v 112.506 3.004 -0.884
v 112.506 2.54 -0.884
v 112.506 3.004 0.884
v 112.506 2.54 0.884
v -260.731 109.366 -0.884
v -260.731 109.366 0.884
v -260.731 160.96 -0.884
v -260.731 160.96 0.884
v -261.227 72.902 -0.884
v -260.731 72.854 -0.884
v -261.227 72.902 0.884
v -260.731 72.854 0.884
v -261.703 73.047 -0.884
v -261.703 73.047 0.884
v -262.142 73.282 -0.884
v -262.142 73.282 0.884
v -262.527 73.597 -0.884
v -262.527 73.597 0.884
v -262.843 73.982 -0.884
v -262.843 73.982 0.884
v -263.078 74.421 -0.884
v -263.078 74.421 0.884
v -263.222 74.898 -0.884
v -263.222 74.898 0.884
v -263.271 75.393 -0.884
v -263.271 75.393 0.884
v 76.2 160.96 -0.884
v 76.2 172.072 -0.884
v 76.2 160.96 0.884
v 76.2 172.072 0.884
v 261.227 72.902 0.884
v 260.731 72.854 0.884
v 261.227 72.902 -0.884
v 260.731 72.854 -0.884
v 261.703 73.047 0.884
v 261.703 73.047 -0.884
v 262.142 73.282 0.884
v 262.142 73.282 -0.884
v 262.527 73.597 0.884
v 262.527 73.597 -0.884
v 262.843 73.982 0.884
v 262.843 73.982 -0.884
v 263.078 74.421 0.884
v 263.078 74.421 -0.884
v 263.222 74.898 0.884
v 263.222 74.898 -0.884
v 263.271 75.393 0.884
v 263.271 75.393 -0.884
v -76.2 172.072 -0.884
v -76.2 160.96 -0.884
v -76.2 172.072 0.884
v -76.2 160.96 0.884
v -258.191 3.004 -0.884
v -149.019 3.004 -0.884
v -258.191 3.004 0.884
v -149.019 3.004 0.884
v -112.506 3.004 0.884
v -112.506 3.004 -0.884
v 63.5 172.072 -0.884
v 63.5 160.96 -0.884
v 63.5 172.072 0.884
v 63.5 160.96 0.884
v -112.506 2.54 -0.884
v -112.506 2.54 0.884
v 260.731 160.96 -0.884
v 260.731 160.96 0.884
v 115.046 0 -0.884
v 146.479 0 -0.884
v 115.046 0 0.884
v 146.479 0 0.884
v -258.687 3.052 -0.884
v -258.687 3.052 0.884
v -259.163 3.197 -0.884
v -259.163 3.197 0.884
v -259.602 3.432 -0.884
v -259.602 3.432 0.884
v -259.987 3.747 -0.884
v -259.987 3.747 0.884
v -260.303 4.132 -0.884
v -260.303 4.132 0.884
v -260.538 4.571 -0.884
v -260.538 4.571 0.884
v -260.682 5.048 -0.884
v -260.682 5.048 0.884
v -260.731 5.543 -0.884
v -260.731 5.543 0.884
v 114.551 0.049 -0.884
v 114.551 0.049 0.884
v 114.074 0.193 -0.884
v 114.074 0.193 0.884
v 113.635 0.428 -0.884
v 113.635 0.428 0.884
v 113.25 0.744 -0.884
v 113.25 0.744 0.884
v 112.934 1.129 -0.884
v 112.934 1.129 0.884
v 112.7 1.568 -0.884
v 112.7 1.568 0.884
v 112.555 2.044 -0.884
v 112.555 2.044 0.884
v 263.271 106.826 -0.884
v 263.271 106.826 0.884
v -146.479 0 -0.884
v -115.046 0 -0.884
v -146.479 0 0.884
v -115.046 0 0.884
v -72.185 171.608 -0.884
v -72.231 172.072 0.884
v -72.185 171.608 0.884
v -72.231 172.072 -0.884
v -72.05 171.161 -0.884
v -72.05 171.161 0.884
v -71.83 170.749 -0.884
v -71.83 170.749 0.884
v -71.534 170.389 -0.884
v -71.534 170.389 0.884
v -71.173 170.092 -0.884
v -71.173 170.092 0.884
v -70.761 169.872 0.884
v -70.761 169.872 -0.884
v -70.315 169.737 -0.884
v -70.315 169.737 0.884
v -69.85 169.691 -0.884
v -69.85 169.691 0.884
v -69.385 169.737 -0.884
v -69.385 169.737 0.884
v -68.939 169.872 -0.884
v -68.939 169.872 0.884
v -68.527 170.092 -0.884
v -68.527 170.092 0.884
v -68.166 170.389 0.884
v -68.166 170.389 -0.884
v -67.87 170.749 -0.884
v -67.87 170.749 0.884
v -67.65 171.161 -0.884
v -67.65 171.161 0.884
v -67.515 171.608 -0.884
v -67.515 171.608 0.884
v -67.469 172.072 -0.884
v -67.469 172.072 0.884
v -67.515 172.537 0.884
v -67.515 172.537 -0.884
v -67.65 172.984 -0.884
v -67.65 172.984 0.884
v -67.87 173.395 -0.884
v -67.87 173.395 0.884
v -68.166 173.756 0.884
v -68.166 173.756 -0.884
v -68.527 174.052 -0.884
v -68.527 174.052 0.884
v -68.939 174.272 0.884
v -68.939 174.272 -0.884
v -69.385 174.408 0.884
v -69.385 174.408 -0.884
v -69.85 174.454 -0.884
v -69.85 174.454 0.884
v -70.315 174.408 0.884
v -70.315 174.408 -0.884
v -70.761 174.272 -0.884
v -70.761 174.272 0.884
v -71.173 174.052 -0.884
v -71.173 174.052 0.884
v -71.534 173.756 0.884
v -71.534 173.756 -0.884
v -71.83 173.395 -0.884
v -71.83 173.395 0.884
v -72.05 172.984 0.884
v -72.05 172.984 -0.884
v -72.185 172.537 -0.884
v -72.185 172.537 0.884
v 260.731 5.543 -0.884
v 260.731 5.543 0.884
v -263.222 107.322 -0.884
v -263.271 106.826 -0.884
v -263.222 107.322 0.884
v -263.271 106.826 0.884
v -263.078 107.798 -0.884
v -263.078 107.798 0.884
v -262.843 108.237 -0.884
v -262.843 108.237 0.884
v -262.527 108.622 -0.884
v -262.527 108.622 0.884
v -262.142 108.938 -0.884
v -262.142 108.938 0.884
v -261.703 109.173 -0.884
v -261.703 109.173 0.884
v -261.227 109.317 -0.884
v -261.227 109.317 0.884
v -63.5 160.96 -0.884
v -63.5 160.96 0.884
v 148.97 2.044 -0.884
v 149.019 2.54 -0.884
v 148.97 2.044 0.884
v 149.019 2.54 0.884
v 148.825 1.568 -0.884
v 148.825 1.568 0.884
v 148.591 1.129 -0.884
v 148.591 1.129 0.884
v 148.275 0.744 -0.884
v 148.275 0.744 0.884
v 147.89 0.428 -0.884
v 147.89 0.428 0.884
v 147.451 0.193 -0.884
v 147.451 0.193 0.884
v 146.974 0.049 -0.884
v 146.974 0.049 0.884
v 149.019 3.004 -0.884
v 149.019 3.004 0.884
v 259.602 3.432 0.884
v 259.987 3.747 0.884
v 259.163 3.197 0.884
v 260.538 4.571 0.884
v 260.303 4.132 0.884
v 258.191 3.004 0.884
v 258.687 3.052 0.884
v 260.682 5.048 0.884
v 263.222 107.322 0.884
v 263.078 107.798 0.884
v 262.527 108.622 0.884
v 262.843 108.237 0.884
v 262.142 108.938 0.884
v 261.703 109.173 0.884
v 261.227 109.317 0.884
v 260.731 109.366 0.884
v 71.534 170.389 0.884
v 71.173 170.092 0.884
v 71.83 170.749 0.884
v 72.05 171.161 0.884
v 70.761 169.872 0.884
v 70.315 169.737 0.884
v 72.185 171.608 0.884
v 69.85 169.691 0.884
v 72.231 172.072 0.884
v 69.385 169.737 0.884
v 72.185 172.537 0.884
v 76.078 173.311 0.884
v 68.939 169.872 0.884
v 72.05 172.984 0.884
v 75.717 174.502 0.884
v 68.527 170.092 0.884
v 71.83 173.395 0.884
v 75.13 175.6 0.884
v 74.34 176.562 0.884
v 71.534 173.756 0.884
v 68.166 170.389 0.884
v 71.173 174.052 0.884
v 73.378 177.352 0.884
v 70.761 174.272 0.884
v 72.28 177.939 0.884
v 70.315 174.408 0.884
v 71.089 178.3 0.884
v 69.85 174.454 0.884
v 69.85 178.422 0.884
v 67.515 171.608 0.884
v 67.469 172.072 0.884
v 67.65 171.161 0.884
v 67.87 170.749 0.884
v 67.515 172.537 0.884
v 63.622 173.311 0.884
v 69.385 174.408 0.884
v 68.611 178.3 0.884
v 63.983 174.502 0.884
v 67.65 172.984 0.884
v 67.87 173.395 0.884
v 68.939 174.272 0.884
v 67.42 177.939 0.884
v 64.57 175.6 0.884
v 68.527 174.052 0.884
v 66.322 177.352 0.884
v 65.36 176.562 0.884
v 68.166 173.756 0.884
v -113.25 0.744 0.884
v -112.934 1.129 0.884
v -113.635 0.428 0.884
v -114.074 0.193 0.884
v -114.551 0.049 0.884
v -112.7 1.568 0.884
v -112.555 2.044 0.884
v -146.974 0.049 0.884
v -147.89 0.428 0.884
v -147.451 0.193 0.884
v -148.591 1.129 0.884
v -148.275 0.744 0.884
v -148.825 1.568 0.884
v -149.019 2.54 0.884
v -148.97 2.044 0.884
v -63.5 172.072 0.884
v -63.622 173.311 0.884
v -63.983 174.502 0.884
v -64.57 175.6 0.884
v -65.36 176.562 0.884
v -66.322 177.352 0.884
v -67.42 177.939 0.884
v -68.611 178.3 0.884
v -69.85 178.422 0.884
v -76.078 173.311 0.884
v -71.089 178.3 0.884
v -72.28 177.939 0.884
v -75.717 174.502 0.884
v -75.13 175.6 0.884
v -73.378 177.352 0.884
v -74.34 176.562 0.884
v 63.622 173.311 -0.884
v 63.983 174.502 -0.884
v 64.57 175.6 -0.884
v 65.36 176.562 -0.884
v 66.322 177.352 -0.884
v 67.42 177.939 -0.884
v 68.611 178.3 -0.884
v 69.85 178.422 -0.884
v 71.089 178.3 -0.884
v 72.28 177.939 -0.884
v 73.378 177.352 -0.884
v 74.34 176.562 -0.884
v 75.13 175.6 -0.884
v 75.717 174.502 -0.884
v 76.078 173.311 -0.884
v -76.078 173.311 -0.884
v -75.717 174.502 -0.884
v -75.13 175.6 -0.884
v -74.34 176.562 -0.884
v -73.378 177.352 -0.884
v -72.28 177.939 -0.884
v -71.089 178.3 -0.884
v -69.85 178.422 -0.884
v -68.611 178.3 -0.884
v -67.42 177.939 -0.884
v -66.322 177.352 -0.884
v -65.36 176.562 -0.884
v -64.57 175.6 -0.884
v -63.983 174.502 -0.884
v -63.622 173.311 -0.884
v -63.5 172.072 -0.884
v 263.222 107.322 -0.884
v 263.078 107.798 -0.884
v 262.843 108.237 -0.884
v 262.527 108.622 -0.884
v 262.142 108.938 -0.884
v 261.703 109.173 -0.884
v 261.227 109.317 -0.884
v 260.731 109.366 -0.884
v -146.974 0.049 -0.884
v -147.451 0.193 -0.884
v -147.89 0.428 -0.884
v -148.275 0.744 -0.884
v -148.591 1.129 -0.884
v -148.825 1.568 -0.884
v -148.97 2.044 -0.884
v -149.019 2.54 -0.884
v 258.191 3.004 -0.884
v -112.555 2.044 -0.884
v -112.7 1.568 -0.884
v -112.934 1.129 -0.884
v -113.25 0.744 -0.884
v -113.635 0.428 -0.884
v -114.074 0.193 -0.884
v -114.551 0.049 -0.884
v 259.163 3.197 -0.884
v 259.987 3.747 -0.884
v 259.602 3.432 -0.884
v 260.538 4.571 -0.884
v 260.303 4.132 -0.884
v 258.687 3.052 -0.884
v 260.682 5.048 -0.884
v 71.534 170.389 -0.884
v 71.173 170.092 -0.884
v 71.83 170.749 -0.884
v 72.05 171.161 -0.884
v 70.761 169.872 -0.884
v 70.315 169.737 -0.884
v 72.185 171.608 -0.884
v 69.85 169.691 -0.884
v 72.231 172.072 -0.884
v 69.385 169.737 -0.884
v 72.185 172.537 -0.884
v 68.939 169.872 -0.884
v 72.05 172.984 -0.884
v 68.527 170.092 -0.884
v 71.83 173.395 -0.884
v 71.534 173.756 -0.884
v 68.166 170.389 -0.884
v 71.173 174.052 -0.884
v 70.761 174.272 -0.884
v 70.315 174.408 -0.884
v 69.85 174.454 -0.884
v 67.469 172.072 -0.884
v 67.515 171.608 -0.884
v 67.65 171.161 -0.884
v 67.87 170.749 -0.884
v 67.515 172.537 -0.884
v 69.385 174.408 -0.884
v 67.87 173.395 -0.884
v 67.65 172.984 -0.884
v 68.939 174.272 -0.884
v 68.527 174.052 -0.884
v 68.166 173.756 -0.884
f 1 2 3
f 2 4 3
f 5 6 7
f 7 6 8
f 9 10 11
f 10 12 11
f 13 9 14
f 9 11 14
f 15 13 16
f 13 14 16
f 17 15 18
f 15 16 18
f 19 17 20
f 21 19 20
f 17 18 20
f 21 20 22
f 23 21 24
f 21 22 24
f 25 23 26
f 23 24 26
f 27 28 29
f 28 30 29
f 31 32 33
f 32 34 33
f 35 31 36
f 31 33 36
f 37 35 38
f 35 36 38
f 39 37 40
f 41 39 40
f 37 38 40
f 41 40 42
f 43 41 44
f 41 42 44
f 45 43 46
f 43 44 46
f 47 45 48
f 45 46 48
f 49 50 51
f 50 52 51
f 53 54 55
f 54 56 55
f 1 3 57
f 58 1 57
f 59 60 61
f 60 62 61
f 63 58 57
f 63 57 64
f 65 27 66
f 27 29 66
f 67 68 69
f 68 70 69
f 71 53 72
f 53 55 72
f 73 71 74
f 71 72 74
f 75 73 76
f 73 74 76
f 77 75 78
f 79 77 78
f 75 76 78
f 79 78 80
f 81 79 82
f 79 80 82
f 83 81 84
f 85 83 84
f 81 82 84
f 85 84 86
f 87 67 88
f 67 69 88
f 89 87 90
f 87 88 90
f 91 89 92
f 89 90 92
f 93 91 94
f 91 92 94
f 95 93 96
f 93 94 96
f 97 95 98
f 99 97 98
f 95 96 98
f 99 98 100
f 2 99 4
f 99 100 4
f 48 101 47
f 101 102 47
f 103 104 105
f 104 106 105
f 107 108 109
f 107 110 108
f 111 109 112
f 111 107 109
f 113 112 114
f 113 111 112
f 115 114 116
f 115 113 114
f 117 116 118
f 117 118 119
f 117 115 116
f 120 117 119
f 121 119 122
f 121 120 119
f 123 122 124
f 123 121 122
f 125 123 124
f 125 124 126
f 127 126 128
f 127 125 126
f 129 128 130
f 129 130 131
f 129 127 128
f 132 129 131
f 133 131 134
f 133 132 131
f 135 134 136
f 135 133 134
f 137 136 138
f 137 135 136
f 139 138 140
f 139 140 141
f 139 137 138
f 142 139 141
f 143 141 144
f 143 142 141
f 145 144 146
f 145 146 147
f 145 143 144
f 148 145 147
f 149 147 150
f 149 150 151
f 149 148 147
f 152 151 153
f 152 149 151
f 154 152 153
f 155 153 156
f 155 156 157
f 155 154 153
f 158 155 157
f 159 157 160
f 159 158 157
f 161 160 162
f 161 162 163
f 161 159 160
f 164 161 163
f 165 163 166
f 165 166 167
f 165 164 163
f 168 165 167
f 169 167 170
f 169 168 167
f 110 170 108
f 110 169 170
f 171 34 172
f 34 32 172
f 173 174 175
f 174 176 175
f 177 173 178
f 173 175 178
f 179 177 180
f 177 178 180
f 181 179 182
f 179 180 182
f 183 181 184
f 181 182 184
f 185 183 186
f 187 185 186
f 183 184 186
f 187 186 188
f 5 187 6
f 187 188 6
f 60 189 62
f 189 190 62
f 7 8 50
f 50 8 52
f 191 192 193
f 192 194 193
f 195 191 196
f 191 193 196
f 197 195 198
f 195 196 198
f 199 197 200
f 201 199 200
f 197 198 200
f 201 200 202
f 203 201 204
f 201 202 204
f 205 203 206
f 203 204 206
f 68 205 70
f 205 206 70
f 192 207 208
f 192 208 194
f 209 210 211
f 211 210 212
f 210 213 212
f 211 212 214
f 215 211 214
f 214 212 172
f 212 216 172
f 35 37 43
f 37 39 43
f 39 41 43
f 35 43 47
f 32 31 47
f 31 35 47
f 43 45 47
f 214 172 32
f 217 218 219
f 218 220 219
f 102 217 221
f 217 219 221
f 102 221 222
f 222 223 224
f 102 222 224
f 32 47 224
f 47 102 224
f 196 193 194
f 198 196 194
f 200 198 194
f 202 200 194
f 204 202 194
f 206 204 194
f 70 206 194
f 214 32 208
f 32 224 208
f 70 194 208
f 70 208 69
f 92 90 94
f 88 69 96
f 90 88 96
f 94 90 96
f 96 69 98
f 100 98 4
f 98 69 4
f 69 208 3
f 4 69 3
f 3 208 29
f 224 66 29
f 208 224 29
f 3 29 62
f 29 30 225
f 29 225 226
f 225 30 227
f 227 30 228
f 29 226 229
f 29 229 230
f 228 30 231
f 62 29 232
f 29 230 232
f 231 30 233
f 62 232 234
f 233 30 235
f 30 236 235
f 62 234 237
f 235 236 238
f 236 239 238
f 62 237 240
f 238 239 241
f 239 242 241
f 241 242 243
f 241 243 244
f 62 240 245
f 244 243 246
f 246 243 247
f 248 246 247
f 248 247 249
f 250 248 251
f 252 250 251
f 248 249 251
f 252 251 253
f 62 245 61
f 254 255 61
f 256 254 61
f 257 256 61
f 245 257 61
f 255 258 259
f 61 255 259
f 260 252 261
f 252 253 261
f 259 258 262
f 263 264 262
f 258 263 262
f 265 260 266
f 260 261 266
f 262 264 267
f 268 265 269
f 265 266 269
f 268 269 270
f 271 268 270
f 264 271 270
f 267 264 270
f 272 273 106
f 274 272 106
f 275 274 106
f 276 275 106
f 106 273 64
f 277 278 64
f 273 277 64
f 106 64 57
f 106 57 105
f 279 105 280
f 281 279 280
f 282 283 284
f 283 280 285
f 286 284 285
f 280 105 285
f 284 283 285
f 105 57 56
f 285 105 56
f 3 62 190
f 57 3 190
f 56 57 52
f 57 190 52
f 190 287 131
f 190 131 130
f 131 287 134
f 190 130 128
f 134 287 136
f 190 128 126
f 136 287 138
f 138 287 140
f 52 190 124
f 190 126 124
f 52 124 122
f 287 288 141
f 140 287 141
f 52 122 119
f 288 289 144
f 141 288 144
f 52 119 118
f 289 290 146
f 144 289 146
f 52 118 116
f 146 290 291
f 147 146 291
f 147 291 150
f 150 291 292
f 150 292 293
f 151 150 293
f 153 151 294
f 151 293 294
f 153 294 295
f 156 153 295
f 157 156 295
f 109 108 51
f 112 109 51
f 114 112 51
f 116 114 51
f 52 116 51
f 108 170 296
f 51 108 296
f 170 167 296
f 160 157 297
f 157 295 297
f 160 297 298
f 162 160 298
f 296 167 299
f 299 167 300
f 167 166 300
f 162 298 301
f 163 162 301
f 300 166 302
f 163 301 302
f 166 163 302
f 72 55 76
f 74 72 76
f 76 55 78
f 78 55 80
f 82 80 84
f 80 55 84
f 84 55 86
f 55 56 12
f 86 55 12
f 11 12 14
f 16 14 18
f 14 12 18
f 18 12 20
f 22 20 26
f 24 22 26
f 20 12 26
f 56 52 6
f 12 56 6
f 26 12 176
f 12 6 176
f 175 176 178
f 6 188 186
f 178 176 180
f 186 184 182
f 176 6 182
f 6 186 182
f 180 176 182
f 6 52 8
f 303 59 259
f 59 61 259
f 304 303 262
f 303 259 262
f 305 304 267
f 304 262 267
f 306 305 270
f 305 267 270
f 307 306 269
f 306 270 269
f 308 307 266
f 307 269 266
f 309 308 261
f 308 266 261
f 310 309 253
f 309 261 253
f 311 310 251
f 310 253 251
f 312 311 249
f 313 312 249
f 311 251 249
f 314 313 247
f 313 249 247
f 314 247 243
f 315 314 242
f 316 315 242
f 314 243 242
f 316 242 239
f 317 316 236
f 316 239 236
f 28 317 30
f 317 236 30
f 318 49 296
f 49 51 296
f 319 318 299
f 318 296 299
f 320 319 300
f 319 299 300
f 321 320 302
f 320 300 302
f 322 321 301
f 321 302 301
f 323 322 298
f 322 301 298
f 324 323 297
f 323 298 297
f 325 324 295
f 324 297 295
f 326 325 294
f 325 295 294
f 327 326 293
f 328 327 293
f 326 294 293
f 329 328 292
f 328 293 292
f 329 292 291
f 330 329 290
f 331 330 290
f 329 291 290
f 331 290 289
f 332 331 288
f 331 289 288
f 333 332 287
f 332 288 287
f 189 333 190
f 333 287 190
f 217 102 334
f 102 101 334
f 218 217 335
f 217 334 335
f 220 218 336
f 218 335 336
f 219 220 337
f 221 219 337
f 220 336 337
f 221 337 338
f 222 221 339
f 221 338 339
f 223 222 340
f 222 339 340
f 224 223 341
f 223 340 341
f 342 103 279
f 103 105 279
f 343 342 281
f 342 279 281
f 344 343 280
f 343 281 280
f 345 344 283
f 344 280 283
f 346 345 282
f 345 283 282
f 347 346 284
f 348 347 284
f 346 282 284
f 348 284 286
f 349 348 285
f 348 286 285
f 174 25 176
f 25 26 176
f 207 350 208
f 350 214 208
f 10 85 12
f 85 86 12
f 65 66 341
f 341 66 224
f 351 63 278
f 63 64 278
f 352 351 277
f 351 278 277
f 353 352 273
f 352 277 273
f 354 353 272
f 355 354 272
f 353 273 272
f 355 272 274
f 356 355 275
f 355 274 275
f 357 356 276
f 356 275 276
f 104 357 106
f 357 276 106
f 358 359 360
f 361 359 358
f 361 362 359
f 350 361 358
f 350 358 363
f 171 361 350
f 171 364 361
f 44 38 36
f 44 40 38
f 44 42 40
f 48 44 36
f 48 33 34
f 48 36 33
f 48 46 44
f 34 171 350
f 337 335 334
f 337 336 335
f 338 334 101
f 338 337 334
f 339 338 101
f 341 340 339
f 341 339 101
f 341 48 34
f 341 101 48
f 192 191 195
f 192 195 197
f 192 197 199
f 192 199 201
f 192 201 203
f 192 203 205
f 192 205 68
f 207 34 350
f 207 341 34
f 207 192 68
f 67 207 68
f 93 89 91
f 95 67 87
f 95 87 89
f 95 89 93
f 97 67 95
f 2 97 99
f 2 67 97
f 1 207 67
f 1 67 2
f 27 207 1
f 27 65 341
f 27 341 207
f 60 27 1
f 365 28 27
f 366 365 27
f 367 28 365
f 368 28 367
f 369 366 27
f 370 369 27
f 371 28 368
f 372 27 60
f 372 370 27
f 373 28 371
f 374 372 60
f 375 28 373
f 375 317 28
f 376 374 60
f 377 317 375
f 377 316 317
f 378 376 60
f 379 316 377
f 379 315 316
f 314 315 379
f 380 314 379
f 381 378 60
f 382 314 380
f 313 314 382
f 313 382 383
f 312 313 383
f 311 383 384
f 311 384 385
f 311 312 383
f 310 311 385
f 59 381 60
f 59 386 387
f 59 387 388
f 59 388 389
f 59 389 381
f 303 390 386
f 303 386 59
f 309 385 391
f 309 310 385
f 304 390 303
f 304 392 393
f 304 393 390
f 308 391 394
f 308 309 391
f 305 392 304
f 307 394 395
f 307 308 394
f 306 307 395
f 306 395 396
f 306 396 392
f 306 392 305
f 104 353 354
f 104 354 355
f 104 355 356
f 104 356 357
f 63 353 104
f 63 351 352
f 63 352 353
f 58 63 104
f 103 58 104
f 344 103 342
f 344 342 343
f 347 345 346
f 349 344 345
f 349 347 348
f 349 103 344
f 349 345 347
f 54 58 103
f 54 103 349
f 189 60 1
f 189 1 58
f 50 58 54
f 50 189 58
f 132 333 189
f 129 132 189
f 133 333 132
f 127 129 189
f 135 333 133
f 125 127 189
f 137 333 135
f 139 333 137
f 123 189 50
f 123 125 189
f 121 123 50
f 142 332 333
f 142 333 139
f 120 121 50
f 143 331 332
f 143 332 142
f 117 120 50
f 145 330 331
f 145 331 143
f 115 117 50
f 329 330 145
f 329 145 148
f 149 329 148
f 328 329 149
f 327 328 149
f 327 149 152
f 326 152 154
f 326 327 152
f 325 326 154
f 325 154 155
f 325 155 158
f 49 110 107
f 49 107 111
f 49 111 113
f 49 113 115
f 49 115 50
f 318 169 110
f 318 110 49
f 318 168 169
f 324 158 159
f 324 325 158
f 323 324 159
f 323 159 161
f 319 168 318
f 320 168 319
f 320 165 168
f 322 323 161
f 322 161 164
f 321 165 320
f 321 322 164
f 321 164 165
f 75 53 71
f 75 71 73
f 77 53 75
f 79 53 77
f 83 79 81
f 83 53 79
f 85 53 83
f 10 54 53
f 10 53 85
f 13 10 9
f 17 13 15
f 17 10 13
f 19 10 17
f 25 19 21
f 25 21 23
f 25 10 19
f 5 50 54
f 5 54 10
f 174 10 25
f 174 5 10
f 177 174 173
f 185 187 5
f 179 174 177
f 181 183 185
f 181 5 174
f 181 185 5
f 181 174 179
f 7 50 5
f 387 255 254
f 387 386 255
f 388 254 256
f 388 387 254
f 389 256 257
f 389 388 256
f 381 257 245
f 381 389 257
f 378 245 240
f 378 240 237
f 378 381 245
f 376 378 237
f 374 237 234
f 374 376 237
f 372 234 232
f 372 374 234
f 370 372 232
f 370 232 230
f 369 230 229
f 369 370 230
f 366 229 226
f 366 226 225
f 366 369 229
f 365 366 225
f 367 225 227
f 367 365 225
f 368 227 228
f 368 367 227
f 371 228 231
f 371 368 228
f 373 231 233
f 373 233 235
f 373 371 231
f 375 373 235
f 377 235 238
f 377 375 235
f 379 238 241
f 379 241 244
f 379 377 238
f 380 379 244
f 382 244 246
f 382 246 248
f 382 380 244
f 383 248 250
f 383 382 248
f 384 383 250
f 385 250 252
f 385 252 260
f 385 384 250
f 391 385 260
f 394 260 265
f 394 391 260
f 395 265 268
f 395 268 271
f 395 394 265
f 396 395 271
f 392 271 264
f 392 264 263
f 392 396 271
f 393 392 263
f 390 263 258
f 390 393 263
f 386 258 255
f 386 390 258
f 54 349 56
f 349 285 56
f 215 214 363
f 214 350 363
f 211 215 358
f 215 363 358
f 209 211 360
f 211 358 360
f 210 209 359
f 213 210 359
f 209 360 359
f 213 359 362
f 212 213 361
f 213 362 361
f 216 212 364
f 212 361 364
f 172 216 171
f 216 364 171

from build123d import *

# Parameters (mm, degrees)
SKETCH1_R           = 2.38125
BOSS_EXTRUDE1_DEPTH = 0.88392
FILLET1_R           = 2.54


with BuildPart() as part:
    # Sketch1 → Boss-Extrude1 (new, symmetric)
    with BuildSketch(Plane.XY):
        with BuildLine():
            Line((-260.731250444, 160.9598), (-76.2, 160.9598))
            Line((-76.2, 160.9598), (-76.2, 172.0723))
            ThreePointArc((-76.2, 172.0723), (-69.85, 178.4223), (-63.5, 172.0723))
            Line((-63.5, 172.0723), (-63.5, 160.9598))
            Line((-63.5, 160.9598), (63.5, 160.9598))
            Line((63.5, 160.9598), (63.5, 172.0723))
            ThreePointArc((63.5, 172.0723), (69.85, 178.4223), (76.2, 172.0723))
            Line((76.2, 172.0723), (76.2, 160.9598))
            Line((76.2, 160.9598), (260.731250444, 160.9598))
            Line((260.731250444, 160.9598), (260.731250444, 109.36605))
            Line((260.731250444, 109.36605), (263.271250444, 109.36605))
            Line((263.271250444, 109.36605), (263.271250444, 72.85355))
            Line((263.271250444, 72.85355), (260.731250444, 72.85355))
            Line((260.731250444, 72.85355), (260.731250444, 3.00355))
            Line((260.731250444, 3.00355), (149.018750222, 3.00355))
            Line((149.018750222, 3.00355), (149.018750222, 0))
            Line((149.018750222, 0), (112.506250222, 0))
            Line((112.506250222, 0), (112.506250222, 3.00355))
            Line((112.506250222, 3.00355), (-112.506250222, 3.00355))
            Line((-112.506250222, 3.00355), (-112.506250222, 0))
            Line((-112.506250222, 0), (-149.018750222, 0))
            Line((-149.018750222, 0), (-149.018750222, 3.00355))
            Line((-149.018750222, 3.00355), (-260.731250444, 3.00355))
            Line((-260.731250444, 3.00355), (-260.731250444, 72.85355))
            Line((-260.731250444, 72.85355), (-263.271250444, 72.85355))
            Line((-263.271250444, 72.85355), (-263.271250444, 109.36605))
            Line((-263.271250444, 109.36605), (-260.731250444, 109.36605))
            Line((-260.731250444, 109.36605), (-260.731250444, 160.9598))
        make_face()
        with Locations(Location((-69.85, 172.0723, 0), (0, 0, 180))):
            Circle(SKETCH1_R, mode=Mode.SUBTRACT)
        with Locations(Location((69.85, 172.0723, 0), (0, 0, 180))):
            Circle(SKETCH1_R, mode=Mode.SUBTRACT)
    extrude(amount=BOSS_EXTRUDE1_DEPTH, both=True)

    # Fillet1
    fillet1_edges = [part.edges().sort_by_distance(p)[0] for p in [
        (-263.271250444, 109.36605, 0),
        (-263.271250444, 72.85355, 0),
        (263.271250444, 109.36605, 0),
        (263.271250444, 72.85355, 0),
        (149.018750222, 0, 0),
        (112.506250222, 0, 0),
        (-112.506250222, 0, 0),
        (-149.018750222, 0, 0),
        (-260.731250444, 3.00355, 0),
        (260.731250444, 3.00355, 0),
    ]]
    fillet(fillet1_edges, radius=FILLET1_R - 0.0001)  # a hair under: the kernel refuses the full size


solid = part.part
